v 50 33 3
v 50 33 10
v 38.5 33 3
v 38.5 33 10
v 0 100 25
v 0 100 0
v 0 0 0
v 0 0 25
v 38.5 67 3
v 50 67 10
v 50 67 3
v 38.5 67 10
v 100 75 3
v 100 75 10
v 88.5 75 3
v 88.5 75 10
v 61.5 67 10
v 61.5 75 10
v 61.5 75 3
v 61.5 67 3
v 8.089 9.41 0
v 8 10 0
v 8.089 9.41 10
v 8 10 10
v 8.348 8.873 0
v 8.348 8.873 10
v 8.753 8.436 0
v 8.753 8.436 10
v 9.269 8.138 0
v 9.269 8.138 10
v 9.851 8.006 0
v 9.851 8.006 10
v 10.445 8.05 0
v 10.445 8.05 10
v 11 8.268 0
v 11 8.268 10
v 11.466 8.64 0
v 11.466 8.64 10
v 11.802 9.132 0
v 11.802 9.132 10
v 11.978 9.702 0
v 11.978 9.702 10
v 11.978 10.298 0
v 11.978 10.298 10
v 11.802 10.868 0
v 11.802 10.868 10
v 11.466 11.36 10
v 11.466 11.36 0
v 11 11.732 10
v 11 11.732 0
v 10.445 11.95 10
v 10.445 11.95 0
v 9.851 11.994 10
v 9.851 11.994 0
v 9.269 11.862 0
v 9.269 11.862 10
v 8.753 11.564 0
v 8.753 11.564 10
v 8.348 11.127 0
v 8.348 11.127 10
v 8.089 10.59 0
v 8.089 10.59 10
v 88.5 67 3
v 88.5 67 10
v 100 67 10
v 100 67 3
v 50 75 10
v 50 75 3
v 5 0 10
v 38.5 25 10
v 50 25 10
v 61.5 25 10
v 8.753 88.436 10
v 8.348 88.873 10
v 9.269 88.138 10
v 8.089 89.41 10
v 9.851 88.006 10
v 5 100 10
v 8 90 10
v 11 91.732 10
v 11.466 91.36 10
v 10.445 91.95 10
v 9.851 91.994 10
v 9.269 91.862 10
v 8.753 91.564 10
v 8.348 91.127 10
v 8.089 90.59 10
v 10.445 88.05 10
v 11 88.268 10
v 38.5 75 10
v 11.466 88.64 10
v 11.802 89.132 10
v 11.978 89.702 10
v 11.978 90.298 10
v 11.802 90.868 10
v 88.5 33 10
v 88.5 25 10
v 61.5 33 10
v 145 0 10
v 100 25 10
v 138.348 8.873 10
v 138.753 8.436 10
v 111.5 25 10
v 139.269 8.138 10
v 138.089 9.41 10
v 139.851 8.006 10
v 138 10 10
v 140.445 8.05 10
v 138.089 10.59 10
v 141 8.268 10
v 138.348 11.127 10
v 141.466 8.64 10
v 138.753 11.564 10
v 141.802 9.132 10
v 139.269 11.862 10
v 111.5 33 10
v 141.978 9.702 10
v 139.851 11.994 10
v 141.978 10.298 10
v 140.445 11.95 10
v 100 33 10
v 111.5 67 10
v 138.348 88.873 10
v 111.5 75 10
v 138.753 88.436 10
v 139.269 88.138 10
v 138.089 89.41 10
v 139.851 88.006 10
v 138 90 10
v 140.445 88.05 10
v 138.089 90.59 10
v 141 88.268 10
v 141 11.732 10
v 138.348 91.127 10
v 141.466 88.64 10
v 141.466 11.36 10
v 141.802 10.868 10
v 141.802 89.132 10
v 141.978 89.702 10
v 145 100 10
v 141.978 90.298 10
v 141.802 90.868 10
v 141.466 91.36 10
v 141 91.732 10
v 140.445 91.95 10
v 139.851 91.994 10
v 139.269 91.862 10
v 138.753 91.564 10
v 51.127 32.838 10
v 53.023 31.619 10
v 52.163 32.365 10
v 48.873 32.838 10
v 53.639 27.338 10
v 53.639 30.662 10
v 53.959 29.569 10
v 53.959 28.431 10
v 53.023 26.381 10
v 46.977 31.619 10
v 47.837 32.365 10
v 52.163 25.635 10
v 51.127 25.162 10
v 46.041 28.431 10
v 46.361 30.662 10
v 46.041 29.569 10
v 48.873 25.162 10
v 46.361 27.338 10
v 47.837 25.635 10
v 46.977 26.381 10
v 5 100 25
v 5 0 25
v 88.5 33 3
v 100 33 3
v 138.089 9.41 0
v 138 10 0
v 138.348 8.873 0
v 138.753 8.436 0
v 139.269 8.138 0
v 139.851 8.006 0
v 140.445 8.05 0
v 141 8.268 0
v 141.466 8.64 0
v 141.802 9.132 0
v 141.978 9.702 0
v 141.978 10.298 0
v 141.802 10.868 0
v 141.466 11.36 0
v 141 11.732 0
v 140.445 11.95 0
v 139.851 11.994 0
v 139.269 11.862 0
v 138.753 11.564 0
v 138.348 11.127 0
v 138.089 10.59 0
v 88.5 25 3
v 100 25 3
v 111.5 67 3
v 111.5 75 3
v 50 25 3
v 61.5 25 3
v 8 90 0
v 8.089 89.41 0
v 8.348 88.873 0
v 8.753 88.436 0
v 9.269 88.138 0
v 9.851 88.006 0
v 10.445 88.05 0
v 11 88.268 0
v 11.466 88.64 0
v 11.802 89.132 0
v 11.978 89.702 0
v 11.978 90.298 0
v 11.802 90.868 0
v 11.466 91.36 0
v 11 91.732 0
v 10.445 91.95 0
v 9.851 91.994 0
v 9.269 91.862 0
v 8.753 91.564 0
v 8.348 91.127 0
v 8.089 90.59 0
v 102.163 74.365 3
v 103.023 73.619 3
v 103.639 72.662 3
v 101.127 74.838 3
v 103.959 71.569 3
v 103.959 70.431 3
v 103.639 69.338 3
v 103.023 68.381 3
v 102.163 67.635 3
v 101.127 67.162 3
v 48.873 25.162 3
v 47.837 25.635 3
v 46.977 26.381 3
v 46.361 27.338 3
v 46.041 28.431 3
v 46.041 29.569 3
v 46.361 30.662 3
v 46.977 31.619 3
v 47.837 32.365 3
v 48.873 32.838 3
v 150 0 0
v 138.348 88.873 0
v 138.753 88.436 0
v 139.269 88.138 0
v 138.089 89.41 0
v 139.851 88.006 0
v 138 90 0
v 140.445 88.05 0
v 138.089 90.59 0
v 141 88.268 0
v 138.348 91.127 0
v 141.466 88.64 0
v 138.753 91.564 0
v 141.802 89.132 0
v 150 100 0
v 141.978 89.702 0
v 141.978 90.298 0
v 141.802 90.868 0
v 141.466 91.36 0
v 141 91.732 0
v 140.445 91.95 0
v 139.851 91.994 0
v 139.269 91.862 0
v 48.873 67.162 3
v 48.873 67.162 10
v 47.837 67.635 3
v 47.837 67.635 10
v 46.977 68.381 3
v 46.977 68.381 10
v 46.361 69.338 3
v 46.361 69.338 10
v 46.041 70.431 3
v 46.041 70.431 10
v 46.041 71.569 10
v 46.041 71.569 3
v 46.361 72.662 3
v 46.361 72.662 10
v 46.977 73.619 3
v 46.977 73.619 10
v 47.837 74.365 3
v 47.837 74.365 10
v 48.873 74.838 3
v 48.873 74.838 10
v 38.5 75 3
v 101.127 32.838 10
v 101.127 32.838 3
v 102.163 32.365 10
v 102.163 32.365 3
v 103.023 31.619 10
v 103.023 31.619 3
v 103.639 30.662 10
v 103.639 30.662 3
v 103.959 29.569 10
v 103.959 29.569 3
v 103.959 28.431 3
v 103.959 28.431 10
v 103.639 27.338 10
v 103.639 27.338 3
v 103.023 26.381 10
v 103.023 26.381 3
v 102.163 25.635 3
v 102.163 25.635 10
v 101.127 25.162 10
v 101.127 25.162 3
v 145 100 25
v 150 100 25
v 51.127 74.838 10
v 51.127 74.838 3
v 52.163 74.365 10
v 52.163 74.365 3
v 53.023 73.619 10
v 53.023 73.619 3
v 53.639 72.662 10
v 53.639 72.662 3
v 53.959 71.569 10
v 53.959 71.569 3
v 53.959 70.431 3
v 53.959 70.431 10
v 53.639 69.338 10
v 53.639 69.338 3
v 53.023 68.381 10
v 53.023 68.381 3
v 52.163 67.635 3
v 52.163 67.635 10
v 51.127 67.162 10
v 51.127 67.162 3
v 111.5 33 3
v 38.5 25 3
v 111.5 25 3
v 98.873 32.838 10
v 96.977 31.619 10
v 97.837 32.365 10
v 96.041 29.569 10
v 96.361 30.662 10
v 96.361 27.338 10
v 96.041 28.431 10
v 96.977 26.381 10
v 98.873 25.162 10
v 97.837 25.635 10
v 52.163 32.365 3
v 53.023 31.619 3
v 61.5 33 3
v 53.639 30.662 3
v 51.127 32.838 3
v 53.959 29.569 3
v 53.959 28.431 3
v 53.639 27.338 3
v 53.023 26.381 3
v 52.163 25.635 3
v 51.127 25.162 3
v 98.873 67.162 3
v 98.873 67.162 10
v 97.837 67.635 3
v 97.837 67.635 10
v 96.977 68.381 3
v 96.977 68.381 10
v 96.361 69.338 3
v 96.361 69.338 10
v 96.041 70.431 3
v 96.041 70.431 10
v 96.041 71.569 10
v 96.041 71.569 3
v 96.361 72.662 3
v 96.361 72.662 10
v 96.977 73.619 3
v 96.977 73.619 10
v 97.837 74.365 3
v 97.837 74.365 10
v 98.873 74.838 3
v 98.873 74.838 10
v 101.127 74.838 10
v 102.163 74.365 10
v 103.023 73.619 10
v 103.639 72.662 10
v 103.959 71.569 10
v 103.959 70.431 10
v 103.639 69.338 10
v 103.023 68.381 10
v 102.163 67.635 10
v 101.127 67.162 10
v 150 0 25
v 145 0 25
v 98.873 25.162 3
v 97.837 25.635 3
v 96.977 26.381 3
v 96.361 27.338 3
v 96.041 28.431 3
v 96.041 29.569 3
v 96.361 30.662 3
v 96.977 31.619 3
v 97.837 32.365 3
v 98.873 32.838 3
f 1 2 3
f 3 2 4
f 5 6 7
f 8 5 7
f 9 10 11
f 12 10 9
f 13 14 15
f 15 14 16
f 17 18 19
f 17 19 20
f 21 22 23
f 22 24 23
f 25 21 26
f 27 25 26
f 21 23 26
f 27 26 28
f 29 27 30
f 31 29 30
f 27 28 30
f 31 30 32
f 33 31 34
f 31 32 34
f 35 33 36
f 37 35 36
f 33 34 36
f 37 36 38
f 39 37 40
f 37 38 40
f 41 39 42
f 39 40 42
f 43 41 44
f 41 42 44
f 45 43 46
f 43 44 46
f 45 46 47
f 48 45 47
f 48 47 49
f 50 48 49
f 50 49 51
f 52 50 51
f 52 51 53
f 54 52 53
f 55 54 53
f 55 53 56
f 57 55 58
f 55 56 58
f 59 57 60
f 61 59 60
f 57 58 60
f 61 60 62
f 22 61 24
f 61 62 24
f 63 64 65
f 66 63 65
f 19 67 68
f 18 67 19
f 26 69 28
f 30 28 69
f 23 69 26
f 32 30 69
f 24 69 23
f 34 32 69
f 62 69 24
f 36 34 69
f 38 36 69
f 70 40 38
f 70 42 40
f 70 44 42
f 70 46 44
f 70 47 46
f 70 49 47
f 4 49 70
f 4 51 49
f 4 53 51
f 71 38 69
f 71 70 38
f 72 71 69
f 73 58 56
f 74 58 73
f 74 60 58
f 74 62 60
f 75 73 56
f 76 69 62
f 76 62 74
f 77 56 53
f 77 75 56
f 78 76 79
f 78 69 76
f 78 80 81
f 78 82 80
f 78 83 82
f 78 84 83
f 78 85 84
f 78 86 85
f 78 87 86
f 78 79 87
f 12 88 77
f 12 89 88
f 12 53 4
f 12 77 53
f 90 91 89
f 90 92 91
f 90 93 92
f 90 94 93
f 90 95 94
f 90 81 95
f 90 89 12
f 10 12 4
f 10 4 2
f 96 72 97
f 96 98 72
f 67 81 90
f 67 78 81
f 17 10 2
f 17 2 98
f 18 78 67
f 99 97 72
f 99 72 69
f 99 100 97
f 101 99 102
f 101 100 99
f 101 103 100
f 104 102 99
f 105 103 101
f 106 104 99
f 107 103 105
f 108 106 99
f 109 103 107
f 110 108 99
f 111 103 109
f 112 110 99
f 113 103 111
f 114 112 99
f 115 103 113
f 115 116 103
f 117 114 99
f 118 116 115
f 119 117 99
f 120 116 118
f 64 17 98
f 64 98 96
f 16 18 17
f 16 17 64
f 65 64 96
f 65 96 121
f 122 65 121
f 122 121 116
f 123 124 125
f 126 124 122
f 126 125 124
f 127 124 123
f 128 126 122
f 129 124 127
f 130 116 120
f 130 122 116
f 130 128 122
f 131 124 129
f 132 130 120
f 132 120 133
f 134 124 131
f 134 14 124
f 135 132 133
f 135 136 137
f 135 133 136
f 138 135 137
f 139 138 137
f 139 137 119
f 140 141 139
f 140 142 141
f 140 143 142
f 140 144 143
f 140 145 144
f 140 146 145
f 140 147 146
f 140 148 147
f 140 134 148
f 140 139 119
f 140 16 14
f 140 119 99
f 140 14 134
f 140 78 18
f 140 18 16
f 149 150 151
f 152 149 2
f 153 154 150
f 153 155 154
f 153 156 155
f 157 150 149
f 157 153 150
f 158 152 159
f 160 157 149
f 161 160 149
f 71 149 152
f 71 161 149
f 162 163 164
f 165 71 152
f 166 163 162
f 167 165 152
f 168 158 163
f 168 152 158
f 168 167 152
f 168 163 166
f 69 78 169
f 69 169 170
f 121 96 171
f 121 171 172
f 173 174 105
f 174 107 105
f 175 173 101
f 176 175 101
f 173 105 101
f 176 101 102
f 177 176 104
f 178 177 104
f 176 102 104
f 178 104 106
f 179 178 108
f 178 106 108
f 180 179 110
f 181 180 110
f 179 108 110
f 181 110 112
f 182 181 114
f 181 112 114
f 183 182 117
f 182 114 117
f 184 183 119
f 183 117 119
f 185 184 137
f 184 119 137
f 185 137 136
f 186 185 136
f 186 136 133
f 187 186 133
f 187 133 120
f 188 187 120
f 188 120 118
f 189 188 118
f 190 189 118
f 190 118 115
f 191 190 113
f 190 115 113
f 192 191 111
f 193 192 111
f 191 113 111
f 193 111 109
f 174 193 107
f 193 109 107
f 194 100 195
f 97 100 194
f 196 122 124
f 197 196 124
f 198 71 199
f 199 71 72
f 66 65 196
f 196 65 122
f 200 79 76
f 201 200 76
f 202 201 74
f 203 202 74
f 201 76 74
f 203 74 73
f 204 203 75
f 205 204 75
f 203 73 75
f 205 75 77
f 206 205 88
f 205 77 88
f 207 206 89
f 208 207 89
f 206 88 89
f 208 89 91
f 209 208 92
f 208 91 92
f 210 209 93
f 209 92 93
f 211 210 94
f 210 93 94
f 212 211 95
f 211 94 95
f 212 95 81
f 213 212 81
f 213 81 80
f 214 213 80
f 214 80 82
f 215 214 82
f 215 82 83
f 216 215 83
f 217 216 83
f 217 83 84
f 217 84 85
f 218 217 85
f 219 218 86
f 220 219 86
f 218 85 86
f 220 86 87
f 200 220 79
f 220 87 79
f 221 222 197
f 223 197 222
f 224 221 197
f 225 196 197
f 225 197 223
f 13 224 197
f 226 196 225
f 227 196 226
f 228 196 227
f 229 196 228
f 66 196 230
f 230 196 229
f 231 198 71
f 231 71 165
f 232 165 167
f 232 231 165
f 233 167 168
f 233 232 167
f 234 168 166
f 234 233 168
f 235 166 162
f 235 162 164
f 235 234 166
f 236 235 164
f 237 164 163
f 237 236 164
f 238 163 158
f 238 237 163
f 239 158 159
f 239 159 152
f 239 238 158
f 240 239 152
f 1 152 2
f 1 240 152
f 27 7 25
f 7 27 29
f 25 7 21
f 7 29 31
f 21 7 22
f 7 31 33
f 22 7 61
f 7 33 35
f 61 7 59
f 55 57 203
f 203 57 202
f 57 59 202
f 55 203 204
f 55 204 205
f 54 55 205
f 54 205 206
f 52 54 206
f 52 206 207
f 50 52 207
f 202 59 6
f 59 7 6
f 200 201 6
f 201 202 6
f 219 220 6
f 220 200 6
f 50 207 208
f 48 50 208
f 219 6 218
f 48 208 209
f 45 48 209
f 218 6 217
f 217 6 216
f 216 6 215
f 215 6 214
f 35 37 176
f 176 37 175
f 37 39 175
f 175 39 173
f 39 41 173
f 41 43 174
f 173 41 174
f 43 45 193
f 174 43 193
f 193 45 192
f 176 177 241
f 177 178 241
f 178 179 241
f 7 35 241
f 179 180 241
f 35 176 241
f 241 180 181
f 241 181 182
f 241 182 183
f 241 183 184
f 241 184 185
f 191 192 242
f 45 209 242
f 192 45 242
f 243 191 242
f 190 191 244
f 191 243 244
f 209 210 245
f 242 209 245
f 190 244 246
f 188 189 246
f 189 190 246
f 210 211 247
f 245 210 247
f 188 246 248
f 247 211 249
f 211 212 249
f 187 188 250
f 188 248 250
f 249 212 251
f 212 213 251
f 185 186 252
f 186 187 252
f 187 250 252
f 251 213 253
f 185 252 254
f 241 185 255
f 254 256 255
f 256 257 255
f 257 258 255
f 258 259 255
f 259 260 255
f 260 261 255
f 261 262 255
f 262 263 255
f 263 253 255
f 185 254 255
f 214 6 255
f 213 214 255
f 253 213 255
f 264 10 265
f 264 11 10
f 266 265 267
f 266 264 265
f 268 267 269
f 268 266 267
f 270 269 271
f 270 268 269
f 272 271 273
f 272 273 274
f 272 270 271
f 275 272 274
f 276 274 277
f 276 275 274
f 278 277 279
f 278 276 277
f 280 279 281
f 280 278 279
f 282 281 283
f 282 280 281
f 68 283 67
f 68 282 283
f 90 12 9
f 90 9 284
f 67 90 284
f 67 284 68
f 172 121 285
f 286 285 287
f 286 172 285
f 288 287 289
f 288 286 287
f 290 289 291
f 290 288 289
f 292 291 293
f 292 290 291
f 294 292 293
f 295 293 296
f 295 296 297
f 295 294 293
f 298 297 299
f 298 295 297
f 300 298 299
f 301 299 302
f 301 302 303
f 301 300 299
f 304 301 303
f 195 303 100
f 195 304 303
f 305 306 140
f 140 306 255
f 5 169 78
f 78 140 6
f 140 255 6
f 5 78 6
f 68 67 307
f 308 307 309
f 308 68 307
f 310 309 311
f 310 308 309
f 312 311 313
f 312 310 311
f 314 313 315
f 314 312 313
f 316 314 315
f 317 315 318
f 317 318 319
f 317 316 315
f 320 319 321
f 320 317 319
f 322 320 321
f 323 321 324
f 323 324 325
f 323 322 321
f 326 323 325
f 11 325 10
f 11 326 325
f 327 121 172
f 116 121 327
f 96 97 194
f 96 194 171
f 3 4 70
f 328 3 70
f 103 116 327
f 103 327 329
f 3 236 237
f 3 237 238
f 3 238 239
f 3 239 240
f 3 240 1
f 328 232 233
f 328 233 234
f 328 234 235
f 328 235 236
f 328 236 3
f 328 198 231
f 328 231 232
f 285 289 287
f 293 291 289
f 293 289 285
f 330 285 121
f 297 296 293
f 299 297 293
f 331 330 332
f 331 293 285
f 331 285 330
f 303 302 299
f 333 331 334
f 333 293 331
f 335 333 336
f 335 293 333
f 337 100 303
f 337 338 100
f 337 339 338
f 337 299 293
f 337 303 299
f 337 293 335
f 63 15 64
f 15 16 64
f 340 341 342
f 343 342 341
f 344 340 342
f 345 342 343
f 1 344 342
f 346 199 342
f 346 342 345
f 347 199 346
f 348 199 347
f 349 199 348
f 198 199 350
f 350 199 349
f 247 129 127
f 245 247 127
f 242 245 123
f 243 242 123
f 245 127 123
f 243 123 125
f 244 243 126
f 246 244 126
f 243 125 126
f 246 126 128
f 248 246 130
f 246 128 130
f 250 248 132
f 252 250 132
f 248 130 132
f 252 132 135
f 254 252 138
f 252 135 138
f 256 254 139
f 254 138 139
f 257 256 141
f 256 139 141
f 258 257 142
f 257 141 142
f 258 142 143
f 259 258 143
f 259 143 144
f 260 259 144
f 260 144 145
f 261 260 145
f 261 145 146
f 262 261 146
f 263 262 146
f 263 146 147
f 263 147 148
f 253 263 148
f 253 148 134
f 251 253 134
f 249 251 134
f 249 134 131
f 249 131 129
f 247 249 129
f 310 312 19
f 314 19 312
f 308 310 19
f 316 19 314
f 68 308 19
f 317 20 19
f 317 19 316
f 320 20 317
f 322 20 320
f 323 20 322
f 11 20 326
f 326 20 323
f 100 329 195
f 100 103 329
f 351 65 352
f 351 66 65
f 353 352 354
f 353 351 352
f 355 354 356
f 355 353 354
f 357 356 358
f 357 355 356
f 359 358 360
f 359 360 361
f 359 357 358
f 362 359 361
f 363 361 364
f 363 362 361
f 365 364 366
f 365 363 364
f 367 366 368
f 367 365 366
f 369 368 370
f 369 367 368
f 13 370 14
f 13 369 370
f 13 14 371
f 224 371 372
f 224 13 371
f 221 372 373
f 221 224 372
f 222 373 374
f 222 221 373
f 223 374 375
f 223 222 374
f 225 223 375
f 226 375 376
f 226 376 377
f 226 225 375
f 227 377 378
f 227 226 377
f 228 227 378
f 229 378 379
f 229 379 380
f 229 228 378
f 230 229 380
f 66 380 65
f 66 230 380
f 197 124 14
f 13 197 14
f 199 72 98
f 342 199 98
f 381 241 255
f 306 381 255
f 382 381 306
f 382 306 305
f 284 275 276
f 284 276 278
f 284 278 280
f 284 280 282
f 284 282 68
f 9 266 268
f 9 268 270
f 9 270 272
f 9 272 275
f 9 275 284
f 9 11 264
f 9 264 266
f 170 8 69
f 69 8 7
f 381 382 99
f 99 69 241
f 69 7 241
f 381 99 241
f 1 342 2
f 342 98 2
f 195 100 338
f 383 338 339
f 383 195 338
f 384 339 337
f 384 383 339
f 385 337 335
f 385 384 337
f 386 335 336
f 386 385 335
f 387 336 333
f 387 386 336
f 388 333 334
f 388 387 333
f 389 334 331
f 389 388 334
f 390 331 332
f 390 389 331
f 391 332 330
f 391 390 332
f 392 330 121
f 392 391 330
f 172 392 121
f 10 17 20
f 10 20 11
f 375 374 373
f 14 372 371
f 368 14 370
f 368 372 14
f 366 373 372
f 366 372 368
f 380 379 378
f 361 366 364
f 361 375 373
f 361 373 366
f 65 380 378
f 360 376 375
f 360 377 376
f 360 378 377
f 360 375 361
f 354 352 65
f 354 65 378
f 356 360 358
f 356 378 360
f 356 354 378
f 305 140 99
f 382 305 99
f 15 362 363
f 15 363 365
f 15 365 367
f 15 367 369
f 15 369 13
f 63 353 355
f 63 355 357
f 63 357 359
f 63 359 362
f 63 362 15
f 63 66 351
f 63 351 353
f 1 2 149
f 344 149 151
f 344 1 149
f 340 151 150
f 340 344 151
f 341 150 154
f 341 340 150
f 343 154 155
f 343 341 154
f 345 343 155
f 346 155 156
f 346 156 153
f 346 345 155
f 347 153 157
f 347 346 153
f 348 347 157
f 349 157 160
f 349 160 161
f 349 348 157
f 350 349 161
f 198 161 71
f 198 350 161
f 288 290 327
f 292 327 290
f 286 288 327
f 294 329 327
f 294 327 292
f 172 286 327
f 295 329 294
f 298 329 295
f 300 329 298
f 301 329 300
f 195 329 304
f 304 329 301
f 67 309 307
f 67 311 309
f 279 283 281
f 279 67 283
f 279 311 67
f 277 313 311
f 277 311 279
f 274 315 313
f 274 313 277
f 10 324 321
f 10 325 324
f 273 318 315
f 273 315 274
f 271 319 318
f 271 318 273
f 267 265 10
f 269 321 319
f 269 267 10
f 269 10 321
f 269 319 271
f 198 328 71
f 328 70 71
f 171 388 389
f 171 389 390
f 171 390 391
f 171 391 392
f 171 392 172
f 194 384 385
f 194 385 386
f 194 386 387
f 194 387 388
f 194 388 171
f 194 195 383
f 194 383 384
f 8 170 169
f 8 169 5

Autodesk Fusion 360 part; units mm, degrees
sketch "Sketch1" plane through (0, 0, 0) normal (0, 0, 1) x (1, 0, 0)
  line L0 (0, 0) -> (150, 0)
  line L1 (150, 0) -> (150, 100)
  line L2 (150, 100) -> (0, 100)
  line L3 (0, 100) -> (0, 0)
  dimension "d1" = 100
  dimension "d2" = 150
extrude "Extrude1" add sketch "Sketch1" along normal blind 10
sketch "Sketch2" plane through (0, 0, 10) normal (0, 0, 1) x (-1, 0, 0)
  line L0 (0, -100) -> (0, 0)
  line L1 (0, 0) -> (-150, 0)
  line L2 (-150, 0) -> (-150, -100)
  line L3 (-150, -100) -> (0, -100)
  line L4 (-38.5, -75) -> (-61.5, -75)
  line L5 (-61.5, -75) -> (-61.5, -67)
  line L6 (-61.5, -67) -> (-38.5, -67)
  line L7 (-38.5, -67) -> (-38.5, -75)
  line L8 (-111.5, -75) -> (-88.5, -75)
  line L9 (-88.5, -75) -> (-88.5, -67)
  line L10 (-88.5, -67) -> (-111.5, -67)
  line L11 (-111.5, -67) -> (-111.5, -75)
  dimension "d5" = 8
  dimension "d6" = 23
  dimension "d7" = 38.5
  dimension "d8" = 23
  dimension "d9" = 8
  dimension "d10" = 38.5
  dimension "d11" = 25
  dimension "d12" = 25
sketch "Sketch3" plane through (0, 0, 10) normal (0, 0, 1) x (-1, 0, 0)
  line L0 (-38.5, -25) -> (-61.5, -25)
  line L1 (-61.5, -25) -> (-61.5, -33)
  line L2 (-61.5, -33) -> (-38.5, -33)
  line L3 (-38.5, -33) -> (-38.5, -25)
  line L4 (0, -100) -> (0, 0)
  line L5 (0, 0) -> (-150, 0)
  line L6 (-111.5, -25) -> (-88.5, -25)
  line L7 (-88.5, -25) -> (-88.5, -33)
  line L8 (-88.5, -33) -> (-111.5, -33)
  line L9 (-111.5, -33) -> (-111.5, -25)
  line L10 (-150, 0) -> (-150, -100)
  dimension "d13" = 8
  dimension "d14" = 23
  dimension "d15" = 38.5
  dimension "d16" = 25
  dimension "d17" = 8
  dimension "d18" = 23
  dimension "d19" = 38.5
  dimension "d20" = 25
extrude "Extrude2" cut sketch "Sketch3" against normal blind 7
extrude "Extrude3" cut sketch "Sketch2" against normal blind 7 contours L4 L5 L6 L7 | L8 L9 L10 L11
sketch "Sketch4" plane through (0, 0, 3) normal (0, 0, 1) x (-1, 0, 0)
  line L0 (-38.5, -67) -> (-61.5, -67)
  line L1 (-61.5, -67) -> (-61.5, -75)
  line L2 (-61.5, -75) -> (-38.5, -75)
  line L3 (-38.5, -75) -> (-38.5, -67)
  line L4 (-38.5, -25) -> (-38.5, -33)
  circle A0 centre (-50, -29) radius 4
  line L5 (-61.5, -25) -> (-38.5, -25)
  line L6 (-61.5, -33) -> (-61.5, -25)
  circle A1 centre (-50, -71) radius 4
  circle A2 centre (-100, -71) radius 4
  line L7 (-111.5, -75) -> (-111.5, -67)
  line L8 (-88.5, -75) -> (-111.5, -75)
  circle A3 centre (-100, -29) radius 4
  line L9 (-111.5, -33) -> (-111.5, -25)
  line L10 (-88.5, -33) -> (-111.5, -33)
  dimension "d27" = 8
  dimension "d28" = 4
  dimension "d29" = 11.5
  dimension "d30" = 8
  dimension "d31" = 11.5
  dimension "d32" = 4
  dimension "d33" = 8
  dimension "d34" = 11.5
  dimension "d35" = 4
  dimension "d36" = 8
  dimension "d37" = 11.5
  dimension "d38" = 4
extrude "Extrude4" add sketch "Sketch4" along normal blind 7 contours A1 | A0 | A2 | A3
sketch "Sketch5" plane through (0, 0, 0) normal (0, 0, 1) x (1, 0, 0)
sketch "Sketch6" plane through (0, 0, 10) normal (0, 0, 1) x (-1, 0, 0)
  line L0 (-61.5, -75) -> (-61.5, -67)
  line L1 (-61.5, -67) -> (-50, -67)
  line L2 (-50, -67) -> (-38.5, -67)
  line L3 (-38.5, -67) -> (-38.5, -75)
  line L4 (-38.5, -75) -> (-50, -75)
  line L5 (-50, -75) -> (-61.5, -75)
  line L6 (-88.5, -75) -> (-100, -75)
  line L7 (-100, -75) -> (-111.5, -75)
  line L8 (-111.5, -75) -> (-111.5, -67)
  line L9 (-111.5, -67) -> (-100, -67)
  line L10 (-100, -67) -> (-88.5, -67)
  line L11 (-88.5, -67) -> (-88.5, -75)
  line L12 (-88.5, -25) -> (-88.5, -33)
  line L13 (-88.5, -33) -> (-100, -33)
  line L14 (-100, -33) -> (-111.5, -33)
  line L15 (-111.5, -33) -> (-111.5, -25)
  line L16 (-111.5, -25) -> (-100, -25)
  line L17 (-100, -25) -> (-88.5, -25)
  line L18 (-61.5, -25) -> (-50, -25)
  line L19 (-50, -25) -> (-38.5, -25)
  line L20 (-38.5, -25) -> (-38.5, -33)
  line L21 (-38.5, -33) -> (-50, -33)
  line L22 (-50, -33) -> (-61.5, -33)
  line L23 (-61.5, -33) -> (-61.5, -25)
  line L24 (0, -100) -> (0, 0)
  line L25 (0, 0) -> (-150, 0)
  line L26 (-150, 0) -> (-150, -100)
  line L27 (-150, -100) -> (0, -100)
  line L28 (0, -100) -> (-5, -100)
  line L29 (-5, -100) -> (-5, 0)
  line L30 (-5, 0) -> (0, 0)
  line L31 (0, 0) -> (0, -100)
  line L32 (-150, -100) -> (-145, -100)
  line L33 (-145, -100) -> (-145, 0)
  line L34 (-145, 0) -> (-150, 0)
  line L35 (-150, 0) -> (-150, -100)
  dimension "d42" = 5
  dimension "d43" = 100
  dimension "d44" = 5
extrude "Extrude5" add sketch "Sketch6" along normal blind 15 contours L24 L25 L27 L28 L29 L30 L31 | L25 L26 L27 L32 L33 L34 L35
sketch "Sketch7" plane through (0, 0, 10) normal (0, 0, 1) x (-1, 0, 0)
  line L0 (-145, 0) -> (-145, -100)
  line L1 (-145, -100) -> (-5, -100)
  line L2 (-5, -100) -> (-5, 0)
  line L3 (-5, 0) -> (-145, 0)
  line L4 (-61.5, -25) -> (-50, -25)
  line L5 (-50, -25) -> (-38.5, -25)
  line L6 (-38.5, -25) -> (-38.5, -33)
  line L7 (-38.5, -33) -> (-50, -33)
  line L8 (-50, -33) -> (-61.5, -33)
  line L9 (-61.5, -33) -> (-61.5, -25)
  line L10 (-88.5, -25) -> (-88.5, -33)
  line L11 (-88.5, -33) -> (-100, -33)
  line L12 (-100, -33) -> (-111.5, -33)
  line L13 (-111.5, -33) -> (-111.5, -25)
  line L14 (-111.5, -25) -> (-100, -25)
  line L15 (-100, -25) -> (-88.5, -25)
  line L16 (-88.5, -75) -> (-100, -75)
  line L17 (-100, -75) -> (-111.5, -75)
  line L18 (-111.5, -75) -> (-111.5, -67)
  line L19 (-111.5, -67) -> (-100, -67)
  line L20 (-100, -67) -> (-88.5, -67)
  line L21 (-88.5, -67) -> (-88.5, -75)
  line L22 (-61.5, -75) -> (-61.5, -67)
  line L23 (-61.5, -67) -> (-50, -67)
  line L24 (-50, -67) -> (-38.5, -67)
  line L25 (-38.5, -67) -> (-38.5, -75)
  line L26 (-38.5, -75) -> (-50, -75)
  line L27 (-50, -75) -> (-61.5, -75)
  circle A0 centre (-140, -10) radius 2
  circle A1 centre (-10, -10) radius 2
  circle A2 centre (-10, -90) radius 2
  circle A3 centre (-140, -90) radius 2
  line L28 (0, -100) -> (0, 0)
  line L29 (-150, 0) -> (-150, -100)
  dimension "d47" = 4
  dimension "d48" = 4
  dimension "d49" = 4
  dimension "d50" = 4
  dimension "d51" = 10
  dimension "d52" = 10
  dimension "d53" = 10
  dimension "d54" = 10
  dimension "d55" = 10
  dimension "d56" = 10
  dimension "d57" = 10
  dimension "d58" = 10
extrude "Extrude6" cut sketch "Sketch7" against normal blind 10 contours A0 | A1 | A2 | A3
